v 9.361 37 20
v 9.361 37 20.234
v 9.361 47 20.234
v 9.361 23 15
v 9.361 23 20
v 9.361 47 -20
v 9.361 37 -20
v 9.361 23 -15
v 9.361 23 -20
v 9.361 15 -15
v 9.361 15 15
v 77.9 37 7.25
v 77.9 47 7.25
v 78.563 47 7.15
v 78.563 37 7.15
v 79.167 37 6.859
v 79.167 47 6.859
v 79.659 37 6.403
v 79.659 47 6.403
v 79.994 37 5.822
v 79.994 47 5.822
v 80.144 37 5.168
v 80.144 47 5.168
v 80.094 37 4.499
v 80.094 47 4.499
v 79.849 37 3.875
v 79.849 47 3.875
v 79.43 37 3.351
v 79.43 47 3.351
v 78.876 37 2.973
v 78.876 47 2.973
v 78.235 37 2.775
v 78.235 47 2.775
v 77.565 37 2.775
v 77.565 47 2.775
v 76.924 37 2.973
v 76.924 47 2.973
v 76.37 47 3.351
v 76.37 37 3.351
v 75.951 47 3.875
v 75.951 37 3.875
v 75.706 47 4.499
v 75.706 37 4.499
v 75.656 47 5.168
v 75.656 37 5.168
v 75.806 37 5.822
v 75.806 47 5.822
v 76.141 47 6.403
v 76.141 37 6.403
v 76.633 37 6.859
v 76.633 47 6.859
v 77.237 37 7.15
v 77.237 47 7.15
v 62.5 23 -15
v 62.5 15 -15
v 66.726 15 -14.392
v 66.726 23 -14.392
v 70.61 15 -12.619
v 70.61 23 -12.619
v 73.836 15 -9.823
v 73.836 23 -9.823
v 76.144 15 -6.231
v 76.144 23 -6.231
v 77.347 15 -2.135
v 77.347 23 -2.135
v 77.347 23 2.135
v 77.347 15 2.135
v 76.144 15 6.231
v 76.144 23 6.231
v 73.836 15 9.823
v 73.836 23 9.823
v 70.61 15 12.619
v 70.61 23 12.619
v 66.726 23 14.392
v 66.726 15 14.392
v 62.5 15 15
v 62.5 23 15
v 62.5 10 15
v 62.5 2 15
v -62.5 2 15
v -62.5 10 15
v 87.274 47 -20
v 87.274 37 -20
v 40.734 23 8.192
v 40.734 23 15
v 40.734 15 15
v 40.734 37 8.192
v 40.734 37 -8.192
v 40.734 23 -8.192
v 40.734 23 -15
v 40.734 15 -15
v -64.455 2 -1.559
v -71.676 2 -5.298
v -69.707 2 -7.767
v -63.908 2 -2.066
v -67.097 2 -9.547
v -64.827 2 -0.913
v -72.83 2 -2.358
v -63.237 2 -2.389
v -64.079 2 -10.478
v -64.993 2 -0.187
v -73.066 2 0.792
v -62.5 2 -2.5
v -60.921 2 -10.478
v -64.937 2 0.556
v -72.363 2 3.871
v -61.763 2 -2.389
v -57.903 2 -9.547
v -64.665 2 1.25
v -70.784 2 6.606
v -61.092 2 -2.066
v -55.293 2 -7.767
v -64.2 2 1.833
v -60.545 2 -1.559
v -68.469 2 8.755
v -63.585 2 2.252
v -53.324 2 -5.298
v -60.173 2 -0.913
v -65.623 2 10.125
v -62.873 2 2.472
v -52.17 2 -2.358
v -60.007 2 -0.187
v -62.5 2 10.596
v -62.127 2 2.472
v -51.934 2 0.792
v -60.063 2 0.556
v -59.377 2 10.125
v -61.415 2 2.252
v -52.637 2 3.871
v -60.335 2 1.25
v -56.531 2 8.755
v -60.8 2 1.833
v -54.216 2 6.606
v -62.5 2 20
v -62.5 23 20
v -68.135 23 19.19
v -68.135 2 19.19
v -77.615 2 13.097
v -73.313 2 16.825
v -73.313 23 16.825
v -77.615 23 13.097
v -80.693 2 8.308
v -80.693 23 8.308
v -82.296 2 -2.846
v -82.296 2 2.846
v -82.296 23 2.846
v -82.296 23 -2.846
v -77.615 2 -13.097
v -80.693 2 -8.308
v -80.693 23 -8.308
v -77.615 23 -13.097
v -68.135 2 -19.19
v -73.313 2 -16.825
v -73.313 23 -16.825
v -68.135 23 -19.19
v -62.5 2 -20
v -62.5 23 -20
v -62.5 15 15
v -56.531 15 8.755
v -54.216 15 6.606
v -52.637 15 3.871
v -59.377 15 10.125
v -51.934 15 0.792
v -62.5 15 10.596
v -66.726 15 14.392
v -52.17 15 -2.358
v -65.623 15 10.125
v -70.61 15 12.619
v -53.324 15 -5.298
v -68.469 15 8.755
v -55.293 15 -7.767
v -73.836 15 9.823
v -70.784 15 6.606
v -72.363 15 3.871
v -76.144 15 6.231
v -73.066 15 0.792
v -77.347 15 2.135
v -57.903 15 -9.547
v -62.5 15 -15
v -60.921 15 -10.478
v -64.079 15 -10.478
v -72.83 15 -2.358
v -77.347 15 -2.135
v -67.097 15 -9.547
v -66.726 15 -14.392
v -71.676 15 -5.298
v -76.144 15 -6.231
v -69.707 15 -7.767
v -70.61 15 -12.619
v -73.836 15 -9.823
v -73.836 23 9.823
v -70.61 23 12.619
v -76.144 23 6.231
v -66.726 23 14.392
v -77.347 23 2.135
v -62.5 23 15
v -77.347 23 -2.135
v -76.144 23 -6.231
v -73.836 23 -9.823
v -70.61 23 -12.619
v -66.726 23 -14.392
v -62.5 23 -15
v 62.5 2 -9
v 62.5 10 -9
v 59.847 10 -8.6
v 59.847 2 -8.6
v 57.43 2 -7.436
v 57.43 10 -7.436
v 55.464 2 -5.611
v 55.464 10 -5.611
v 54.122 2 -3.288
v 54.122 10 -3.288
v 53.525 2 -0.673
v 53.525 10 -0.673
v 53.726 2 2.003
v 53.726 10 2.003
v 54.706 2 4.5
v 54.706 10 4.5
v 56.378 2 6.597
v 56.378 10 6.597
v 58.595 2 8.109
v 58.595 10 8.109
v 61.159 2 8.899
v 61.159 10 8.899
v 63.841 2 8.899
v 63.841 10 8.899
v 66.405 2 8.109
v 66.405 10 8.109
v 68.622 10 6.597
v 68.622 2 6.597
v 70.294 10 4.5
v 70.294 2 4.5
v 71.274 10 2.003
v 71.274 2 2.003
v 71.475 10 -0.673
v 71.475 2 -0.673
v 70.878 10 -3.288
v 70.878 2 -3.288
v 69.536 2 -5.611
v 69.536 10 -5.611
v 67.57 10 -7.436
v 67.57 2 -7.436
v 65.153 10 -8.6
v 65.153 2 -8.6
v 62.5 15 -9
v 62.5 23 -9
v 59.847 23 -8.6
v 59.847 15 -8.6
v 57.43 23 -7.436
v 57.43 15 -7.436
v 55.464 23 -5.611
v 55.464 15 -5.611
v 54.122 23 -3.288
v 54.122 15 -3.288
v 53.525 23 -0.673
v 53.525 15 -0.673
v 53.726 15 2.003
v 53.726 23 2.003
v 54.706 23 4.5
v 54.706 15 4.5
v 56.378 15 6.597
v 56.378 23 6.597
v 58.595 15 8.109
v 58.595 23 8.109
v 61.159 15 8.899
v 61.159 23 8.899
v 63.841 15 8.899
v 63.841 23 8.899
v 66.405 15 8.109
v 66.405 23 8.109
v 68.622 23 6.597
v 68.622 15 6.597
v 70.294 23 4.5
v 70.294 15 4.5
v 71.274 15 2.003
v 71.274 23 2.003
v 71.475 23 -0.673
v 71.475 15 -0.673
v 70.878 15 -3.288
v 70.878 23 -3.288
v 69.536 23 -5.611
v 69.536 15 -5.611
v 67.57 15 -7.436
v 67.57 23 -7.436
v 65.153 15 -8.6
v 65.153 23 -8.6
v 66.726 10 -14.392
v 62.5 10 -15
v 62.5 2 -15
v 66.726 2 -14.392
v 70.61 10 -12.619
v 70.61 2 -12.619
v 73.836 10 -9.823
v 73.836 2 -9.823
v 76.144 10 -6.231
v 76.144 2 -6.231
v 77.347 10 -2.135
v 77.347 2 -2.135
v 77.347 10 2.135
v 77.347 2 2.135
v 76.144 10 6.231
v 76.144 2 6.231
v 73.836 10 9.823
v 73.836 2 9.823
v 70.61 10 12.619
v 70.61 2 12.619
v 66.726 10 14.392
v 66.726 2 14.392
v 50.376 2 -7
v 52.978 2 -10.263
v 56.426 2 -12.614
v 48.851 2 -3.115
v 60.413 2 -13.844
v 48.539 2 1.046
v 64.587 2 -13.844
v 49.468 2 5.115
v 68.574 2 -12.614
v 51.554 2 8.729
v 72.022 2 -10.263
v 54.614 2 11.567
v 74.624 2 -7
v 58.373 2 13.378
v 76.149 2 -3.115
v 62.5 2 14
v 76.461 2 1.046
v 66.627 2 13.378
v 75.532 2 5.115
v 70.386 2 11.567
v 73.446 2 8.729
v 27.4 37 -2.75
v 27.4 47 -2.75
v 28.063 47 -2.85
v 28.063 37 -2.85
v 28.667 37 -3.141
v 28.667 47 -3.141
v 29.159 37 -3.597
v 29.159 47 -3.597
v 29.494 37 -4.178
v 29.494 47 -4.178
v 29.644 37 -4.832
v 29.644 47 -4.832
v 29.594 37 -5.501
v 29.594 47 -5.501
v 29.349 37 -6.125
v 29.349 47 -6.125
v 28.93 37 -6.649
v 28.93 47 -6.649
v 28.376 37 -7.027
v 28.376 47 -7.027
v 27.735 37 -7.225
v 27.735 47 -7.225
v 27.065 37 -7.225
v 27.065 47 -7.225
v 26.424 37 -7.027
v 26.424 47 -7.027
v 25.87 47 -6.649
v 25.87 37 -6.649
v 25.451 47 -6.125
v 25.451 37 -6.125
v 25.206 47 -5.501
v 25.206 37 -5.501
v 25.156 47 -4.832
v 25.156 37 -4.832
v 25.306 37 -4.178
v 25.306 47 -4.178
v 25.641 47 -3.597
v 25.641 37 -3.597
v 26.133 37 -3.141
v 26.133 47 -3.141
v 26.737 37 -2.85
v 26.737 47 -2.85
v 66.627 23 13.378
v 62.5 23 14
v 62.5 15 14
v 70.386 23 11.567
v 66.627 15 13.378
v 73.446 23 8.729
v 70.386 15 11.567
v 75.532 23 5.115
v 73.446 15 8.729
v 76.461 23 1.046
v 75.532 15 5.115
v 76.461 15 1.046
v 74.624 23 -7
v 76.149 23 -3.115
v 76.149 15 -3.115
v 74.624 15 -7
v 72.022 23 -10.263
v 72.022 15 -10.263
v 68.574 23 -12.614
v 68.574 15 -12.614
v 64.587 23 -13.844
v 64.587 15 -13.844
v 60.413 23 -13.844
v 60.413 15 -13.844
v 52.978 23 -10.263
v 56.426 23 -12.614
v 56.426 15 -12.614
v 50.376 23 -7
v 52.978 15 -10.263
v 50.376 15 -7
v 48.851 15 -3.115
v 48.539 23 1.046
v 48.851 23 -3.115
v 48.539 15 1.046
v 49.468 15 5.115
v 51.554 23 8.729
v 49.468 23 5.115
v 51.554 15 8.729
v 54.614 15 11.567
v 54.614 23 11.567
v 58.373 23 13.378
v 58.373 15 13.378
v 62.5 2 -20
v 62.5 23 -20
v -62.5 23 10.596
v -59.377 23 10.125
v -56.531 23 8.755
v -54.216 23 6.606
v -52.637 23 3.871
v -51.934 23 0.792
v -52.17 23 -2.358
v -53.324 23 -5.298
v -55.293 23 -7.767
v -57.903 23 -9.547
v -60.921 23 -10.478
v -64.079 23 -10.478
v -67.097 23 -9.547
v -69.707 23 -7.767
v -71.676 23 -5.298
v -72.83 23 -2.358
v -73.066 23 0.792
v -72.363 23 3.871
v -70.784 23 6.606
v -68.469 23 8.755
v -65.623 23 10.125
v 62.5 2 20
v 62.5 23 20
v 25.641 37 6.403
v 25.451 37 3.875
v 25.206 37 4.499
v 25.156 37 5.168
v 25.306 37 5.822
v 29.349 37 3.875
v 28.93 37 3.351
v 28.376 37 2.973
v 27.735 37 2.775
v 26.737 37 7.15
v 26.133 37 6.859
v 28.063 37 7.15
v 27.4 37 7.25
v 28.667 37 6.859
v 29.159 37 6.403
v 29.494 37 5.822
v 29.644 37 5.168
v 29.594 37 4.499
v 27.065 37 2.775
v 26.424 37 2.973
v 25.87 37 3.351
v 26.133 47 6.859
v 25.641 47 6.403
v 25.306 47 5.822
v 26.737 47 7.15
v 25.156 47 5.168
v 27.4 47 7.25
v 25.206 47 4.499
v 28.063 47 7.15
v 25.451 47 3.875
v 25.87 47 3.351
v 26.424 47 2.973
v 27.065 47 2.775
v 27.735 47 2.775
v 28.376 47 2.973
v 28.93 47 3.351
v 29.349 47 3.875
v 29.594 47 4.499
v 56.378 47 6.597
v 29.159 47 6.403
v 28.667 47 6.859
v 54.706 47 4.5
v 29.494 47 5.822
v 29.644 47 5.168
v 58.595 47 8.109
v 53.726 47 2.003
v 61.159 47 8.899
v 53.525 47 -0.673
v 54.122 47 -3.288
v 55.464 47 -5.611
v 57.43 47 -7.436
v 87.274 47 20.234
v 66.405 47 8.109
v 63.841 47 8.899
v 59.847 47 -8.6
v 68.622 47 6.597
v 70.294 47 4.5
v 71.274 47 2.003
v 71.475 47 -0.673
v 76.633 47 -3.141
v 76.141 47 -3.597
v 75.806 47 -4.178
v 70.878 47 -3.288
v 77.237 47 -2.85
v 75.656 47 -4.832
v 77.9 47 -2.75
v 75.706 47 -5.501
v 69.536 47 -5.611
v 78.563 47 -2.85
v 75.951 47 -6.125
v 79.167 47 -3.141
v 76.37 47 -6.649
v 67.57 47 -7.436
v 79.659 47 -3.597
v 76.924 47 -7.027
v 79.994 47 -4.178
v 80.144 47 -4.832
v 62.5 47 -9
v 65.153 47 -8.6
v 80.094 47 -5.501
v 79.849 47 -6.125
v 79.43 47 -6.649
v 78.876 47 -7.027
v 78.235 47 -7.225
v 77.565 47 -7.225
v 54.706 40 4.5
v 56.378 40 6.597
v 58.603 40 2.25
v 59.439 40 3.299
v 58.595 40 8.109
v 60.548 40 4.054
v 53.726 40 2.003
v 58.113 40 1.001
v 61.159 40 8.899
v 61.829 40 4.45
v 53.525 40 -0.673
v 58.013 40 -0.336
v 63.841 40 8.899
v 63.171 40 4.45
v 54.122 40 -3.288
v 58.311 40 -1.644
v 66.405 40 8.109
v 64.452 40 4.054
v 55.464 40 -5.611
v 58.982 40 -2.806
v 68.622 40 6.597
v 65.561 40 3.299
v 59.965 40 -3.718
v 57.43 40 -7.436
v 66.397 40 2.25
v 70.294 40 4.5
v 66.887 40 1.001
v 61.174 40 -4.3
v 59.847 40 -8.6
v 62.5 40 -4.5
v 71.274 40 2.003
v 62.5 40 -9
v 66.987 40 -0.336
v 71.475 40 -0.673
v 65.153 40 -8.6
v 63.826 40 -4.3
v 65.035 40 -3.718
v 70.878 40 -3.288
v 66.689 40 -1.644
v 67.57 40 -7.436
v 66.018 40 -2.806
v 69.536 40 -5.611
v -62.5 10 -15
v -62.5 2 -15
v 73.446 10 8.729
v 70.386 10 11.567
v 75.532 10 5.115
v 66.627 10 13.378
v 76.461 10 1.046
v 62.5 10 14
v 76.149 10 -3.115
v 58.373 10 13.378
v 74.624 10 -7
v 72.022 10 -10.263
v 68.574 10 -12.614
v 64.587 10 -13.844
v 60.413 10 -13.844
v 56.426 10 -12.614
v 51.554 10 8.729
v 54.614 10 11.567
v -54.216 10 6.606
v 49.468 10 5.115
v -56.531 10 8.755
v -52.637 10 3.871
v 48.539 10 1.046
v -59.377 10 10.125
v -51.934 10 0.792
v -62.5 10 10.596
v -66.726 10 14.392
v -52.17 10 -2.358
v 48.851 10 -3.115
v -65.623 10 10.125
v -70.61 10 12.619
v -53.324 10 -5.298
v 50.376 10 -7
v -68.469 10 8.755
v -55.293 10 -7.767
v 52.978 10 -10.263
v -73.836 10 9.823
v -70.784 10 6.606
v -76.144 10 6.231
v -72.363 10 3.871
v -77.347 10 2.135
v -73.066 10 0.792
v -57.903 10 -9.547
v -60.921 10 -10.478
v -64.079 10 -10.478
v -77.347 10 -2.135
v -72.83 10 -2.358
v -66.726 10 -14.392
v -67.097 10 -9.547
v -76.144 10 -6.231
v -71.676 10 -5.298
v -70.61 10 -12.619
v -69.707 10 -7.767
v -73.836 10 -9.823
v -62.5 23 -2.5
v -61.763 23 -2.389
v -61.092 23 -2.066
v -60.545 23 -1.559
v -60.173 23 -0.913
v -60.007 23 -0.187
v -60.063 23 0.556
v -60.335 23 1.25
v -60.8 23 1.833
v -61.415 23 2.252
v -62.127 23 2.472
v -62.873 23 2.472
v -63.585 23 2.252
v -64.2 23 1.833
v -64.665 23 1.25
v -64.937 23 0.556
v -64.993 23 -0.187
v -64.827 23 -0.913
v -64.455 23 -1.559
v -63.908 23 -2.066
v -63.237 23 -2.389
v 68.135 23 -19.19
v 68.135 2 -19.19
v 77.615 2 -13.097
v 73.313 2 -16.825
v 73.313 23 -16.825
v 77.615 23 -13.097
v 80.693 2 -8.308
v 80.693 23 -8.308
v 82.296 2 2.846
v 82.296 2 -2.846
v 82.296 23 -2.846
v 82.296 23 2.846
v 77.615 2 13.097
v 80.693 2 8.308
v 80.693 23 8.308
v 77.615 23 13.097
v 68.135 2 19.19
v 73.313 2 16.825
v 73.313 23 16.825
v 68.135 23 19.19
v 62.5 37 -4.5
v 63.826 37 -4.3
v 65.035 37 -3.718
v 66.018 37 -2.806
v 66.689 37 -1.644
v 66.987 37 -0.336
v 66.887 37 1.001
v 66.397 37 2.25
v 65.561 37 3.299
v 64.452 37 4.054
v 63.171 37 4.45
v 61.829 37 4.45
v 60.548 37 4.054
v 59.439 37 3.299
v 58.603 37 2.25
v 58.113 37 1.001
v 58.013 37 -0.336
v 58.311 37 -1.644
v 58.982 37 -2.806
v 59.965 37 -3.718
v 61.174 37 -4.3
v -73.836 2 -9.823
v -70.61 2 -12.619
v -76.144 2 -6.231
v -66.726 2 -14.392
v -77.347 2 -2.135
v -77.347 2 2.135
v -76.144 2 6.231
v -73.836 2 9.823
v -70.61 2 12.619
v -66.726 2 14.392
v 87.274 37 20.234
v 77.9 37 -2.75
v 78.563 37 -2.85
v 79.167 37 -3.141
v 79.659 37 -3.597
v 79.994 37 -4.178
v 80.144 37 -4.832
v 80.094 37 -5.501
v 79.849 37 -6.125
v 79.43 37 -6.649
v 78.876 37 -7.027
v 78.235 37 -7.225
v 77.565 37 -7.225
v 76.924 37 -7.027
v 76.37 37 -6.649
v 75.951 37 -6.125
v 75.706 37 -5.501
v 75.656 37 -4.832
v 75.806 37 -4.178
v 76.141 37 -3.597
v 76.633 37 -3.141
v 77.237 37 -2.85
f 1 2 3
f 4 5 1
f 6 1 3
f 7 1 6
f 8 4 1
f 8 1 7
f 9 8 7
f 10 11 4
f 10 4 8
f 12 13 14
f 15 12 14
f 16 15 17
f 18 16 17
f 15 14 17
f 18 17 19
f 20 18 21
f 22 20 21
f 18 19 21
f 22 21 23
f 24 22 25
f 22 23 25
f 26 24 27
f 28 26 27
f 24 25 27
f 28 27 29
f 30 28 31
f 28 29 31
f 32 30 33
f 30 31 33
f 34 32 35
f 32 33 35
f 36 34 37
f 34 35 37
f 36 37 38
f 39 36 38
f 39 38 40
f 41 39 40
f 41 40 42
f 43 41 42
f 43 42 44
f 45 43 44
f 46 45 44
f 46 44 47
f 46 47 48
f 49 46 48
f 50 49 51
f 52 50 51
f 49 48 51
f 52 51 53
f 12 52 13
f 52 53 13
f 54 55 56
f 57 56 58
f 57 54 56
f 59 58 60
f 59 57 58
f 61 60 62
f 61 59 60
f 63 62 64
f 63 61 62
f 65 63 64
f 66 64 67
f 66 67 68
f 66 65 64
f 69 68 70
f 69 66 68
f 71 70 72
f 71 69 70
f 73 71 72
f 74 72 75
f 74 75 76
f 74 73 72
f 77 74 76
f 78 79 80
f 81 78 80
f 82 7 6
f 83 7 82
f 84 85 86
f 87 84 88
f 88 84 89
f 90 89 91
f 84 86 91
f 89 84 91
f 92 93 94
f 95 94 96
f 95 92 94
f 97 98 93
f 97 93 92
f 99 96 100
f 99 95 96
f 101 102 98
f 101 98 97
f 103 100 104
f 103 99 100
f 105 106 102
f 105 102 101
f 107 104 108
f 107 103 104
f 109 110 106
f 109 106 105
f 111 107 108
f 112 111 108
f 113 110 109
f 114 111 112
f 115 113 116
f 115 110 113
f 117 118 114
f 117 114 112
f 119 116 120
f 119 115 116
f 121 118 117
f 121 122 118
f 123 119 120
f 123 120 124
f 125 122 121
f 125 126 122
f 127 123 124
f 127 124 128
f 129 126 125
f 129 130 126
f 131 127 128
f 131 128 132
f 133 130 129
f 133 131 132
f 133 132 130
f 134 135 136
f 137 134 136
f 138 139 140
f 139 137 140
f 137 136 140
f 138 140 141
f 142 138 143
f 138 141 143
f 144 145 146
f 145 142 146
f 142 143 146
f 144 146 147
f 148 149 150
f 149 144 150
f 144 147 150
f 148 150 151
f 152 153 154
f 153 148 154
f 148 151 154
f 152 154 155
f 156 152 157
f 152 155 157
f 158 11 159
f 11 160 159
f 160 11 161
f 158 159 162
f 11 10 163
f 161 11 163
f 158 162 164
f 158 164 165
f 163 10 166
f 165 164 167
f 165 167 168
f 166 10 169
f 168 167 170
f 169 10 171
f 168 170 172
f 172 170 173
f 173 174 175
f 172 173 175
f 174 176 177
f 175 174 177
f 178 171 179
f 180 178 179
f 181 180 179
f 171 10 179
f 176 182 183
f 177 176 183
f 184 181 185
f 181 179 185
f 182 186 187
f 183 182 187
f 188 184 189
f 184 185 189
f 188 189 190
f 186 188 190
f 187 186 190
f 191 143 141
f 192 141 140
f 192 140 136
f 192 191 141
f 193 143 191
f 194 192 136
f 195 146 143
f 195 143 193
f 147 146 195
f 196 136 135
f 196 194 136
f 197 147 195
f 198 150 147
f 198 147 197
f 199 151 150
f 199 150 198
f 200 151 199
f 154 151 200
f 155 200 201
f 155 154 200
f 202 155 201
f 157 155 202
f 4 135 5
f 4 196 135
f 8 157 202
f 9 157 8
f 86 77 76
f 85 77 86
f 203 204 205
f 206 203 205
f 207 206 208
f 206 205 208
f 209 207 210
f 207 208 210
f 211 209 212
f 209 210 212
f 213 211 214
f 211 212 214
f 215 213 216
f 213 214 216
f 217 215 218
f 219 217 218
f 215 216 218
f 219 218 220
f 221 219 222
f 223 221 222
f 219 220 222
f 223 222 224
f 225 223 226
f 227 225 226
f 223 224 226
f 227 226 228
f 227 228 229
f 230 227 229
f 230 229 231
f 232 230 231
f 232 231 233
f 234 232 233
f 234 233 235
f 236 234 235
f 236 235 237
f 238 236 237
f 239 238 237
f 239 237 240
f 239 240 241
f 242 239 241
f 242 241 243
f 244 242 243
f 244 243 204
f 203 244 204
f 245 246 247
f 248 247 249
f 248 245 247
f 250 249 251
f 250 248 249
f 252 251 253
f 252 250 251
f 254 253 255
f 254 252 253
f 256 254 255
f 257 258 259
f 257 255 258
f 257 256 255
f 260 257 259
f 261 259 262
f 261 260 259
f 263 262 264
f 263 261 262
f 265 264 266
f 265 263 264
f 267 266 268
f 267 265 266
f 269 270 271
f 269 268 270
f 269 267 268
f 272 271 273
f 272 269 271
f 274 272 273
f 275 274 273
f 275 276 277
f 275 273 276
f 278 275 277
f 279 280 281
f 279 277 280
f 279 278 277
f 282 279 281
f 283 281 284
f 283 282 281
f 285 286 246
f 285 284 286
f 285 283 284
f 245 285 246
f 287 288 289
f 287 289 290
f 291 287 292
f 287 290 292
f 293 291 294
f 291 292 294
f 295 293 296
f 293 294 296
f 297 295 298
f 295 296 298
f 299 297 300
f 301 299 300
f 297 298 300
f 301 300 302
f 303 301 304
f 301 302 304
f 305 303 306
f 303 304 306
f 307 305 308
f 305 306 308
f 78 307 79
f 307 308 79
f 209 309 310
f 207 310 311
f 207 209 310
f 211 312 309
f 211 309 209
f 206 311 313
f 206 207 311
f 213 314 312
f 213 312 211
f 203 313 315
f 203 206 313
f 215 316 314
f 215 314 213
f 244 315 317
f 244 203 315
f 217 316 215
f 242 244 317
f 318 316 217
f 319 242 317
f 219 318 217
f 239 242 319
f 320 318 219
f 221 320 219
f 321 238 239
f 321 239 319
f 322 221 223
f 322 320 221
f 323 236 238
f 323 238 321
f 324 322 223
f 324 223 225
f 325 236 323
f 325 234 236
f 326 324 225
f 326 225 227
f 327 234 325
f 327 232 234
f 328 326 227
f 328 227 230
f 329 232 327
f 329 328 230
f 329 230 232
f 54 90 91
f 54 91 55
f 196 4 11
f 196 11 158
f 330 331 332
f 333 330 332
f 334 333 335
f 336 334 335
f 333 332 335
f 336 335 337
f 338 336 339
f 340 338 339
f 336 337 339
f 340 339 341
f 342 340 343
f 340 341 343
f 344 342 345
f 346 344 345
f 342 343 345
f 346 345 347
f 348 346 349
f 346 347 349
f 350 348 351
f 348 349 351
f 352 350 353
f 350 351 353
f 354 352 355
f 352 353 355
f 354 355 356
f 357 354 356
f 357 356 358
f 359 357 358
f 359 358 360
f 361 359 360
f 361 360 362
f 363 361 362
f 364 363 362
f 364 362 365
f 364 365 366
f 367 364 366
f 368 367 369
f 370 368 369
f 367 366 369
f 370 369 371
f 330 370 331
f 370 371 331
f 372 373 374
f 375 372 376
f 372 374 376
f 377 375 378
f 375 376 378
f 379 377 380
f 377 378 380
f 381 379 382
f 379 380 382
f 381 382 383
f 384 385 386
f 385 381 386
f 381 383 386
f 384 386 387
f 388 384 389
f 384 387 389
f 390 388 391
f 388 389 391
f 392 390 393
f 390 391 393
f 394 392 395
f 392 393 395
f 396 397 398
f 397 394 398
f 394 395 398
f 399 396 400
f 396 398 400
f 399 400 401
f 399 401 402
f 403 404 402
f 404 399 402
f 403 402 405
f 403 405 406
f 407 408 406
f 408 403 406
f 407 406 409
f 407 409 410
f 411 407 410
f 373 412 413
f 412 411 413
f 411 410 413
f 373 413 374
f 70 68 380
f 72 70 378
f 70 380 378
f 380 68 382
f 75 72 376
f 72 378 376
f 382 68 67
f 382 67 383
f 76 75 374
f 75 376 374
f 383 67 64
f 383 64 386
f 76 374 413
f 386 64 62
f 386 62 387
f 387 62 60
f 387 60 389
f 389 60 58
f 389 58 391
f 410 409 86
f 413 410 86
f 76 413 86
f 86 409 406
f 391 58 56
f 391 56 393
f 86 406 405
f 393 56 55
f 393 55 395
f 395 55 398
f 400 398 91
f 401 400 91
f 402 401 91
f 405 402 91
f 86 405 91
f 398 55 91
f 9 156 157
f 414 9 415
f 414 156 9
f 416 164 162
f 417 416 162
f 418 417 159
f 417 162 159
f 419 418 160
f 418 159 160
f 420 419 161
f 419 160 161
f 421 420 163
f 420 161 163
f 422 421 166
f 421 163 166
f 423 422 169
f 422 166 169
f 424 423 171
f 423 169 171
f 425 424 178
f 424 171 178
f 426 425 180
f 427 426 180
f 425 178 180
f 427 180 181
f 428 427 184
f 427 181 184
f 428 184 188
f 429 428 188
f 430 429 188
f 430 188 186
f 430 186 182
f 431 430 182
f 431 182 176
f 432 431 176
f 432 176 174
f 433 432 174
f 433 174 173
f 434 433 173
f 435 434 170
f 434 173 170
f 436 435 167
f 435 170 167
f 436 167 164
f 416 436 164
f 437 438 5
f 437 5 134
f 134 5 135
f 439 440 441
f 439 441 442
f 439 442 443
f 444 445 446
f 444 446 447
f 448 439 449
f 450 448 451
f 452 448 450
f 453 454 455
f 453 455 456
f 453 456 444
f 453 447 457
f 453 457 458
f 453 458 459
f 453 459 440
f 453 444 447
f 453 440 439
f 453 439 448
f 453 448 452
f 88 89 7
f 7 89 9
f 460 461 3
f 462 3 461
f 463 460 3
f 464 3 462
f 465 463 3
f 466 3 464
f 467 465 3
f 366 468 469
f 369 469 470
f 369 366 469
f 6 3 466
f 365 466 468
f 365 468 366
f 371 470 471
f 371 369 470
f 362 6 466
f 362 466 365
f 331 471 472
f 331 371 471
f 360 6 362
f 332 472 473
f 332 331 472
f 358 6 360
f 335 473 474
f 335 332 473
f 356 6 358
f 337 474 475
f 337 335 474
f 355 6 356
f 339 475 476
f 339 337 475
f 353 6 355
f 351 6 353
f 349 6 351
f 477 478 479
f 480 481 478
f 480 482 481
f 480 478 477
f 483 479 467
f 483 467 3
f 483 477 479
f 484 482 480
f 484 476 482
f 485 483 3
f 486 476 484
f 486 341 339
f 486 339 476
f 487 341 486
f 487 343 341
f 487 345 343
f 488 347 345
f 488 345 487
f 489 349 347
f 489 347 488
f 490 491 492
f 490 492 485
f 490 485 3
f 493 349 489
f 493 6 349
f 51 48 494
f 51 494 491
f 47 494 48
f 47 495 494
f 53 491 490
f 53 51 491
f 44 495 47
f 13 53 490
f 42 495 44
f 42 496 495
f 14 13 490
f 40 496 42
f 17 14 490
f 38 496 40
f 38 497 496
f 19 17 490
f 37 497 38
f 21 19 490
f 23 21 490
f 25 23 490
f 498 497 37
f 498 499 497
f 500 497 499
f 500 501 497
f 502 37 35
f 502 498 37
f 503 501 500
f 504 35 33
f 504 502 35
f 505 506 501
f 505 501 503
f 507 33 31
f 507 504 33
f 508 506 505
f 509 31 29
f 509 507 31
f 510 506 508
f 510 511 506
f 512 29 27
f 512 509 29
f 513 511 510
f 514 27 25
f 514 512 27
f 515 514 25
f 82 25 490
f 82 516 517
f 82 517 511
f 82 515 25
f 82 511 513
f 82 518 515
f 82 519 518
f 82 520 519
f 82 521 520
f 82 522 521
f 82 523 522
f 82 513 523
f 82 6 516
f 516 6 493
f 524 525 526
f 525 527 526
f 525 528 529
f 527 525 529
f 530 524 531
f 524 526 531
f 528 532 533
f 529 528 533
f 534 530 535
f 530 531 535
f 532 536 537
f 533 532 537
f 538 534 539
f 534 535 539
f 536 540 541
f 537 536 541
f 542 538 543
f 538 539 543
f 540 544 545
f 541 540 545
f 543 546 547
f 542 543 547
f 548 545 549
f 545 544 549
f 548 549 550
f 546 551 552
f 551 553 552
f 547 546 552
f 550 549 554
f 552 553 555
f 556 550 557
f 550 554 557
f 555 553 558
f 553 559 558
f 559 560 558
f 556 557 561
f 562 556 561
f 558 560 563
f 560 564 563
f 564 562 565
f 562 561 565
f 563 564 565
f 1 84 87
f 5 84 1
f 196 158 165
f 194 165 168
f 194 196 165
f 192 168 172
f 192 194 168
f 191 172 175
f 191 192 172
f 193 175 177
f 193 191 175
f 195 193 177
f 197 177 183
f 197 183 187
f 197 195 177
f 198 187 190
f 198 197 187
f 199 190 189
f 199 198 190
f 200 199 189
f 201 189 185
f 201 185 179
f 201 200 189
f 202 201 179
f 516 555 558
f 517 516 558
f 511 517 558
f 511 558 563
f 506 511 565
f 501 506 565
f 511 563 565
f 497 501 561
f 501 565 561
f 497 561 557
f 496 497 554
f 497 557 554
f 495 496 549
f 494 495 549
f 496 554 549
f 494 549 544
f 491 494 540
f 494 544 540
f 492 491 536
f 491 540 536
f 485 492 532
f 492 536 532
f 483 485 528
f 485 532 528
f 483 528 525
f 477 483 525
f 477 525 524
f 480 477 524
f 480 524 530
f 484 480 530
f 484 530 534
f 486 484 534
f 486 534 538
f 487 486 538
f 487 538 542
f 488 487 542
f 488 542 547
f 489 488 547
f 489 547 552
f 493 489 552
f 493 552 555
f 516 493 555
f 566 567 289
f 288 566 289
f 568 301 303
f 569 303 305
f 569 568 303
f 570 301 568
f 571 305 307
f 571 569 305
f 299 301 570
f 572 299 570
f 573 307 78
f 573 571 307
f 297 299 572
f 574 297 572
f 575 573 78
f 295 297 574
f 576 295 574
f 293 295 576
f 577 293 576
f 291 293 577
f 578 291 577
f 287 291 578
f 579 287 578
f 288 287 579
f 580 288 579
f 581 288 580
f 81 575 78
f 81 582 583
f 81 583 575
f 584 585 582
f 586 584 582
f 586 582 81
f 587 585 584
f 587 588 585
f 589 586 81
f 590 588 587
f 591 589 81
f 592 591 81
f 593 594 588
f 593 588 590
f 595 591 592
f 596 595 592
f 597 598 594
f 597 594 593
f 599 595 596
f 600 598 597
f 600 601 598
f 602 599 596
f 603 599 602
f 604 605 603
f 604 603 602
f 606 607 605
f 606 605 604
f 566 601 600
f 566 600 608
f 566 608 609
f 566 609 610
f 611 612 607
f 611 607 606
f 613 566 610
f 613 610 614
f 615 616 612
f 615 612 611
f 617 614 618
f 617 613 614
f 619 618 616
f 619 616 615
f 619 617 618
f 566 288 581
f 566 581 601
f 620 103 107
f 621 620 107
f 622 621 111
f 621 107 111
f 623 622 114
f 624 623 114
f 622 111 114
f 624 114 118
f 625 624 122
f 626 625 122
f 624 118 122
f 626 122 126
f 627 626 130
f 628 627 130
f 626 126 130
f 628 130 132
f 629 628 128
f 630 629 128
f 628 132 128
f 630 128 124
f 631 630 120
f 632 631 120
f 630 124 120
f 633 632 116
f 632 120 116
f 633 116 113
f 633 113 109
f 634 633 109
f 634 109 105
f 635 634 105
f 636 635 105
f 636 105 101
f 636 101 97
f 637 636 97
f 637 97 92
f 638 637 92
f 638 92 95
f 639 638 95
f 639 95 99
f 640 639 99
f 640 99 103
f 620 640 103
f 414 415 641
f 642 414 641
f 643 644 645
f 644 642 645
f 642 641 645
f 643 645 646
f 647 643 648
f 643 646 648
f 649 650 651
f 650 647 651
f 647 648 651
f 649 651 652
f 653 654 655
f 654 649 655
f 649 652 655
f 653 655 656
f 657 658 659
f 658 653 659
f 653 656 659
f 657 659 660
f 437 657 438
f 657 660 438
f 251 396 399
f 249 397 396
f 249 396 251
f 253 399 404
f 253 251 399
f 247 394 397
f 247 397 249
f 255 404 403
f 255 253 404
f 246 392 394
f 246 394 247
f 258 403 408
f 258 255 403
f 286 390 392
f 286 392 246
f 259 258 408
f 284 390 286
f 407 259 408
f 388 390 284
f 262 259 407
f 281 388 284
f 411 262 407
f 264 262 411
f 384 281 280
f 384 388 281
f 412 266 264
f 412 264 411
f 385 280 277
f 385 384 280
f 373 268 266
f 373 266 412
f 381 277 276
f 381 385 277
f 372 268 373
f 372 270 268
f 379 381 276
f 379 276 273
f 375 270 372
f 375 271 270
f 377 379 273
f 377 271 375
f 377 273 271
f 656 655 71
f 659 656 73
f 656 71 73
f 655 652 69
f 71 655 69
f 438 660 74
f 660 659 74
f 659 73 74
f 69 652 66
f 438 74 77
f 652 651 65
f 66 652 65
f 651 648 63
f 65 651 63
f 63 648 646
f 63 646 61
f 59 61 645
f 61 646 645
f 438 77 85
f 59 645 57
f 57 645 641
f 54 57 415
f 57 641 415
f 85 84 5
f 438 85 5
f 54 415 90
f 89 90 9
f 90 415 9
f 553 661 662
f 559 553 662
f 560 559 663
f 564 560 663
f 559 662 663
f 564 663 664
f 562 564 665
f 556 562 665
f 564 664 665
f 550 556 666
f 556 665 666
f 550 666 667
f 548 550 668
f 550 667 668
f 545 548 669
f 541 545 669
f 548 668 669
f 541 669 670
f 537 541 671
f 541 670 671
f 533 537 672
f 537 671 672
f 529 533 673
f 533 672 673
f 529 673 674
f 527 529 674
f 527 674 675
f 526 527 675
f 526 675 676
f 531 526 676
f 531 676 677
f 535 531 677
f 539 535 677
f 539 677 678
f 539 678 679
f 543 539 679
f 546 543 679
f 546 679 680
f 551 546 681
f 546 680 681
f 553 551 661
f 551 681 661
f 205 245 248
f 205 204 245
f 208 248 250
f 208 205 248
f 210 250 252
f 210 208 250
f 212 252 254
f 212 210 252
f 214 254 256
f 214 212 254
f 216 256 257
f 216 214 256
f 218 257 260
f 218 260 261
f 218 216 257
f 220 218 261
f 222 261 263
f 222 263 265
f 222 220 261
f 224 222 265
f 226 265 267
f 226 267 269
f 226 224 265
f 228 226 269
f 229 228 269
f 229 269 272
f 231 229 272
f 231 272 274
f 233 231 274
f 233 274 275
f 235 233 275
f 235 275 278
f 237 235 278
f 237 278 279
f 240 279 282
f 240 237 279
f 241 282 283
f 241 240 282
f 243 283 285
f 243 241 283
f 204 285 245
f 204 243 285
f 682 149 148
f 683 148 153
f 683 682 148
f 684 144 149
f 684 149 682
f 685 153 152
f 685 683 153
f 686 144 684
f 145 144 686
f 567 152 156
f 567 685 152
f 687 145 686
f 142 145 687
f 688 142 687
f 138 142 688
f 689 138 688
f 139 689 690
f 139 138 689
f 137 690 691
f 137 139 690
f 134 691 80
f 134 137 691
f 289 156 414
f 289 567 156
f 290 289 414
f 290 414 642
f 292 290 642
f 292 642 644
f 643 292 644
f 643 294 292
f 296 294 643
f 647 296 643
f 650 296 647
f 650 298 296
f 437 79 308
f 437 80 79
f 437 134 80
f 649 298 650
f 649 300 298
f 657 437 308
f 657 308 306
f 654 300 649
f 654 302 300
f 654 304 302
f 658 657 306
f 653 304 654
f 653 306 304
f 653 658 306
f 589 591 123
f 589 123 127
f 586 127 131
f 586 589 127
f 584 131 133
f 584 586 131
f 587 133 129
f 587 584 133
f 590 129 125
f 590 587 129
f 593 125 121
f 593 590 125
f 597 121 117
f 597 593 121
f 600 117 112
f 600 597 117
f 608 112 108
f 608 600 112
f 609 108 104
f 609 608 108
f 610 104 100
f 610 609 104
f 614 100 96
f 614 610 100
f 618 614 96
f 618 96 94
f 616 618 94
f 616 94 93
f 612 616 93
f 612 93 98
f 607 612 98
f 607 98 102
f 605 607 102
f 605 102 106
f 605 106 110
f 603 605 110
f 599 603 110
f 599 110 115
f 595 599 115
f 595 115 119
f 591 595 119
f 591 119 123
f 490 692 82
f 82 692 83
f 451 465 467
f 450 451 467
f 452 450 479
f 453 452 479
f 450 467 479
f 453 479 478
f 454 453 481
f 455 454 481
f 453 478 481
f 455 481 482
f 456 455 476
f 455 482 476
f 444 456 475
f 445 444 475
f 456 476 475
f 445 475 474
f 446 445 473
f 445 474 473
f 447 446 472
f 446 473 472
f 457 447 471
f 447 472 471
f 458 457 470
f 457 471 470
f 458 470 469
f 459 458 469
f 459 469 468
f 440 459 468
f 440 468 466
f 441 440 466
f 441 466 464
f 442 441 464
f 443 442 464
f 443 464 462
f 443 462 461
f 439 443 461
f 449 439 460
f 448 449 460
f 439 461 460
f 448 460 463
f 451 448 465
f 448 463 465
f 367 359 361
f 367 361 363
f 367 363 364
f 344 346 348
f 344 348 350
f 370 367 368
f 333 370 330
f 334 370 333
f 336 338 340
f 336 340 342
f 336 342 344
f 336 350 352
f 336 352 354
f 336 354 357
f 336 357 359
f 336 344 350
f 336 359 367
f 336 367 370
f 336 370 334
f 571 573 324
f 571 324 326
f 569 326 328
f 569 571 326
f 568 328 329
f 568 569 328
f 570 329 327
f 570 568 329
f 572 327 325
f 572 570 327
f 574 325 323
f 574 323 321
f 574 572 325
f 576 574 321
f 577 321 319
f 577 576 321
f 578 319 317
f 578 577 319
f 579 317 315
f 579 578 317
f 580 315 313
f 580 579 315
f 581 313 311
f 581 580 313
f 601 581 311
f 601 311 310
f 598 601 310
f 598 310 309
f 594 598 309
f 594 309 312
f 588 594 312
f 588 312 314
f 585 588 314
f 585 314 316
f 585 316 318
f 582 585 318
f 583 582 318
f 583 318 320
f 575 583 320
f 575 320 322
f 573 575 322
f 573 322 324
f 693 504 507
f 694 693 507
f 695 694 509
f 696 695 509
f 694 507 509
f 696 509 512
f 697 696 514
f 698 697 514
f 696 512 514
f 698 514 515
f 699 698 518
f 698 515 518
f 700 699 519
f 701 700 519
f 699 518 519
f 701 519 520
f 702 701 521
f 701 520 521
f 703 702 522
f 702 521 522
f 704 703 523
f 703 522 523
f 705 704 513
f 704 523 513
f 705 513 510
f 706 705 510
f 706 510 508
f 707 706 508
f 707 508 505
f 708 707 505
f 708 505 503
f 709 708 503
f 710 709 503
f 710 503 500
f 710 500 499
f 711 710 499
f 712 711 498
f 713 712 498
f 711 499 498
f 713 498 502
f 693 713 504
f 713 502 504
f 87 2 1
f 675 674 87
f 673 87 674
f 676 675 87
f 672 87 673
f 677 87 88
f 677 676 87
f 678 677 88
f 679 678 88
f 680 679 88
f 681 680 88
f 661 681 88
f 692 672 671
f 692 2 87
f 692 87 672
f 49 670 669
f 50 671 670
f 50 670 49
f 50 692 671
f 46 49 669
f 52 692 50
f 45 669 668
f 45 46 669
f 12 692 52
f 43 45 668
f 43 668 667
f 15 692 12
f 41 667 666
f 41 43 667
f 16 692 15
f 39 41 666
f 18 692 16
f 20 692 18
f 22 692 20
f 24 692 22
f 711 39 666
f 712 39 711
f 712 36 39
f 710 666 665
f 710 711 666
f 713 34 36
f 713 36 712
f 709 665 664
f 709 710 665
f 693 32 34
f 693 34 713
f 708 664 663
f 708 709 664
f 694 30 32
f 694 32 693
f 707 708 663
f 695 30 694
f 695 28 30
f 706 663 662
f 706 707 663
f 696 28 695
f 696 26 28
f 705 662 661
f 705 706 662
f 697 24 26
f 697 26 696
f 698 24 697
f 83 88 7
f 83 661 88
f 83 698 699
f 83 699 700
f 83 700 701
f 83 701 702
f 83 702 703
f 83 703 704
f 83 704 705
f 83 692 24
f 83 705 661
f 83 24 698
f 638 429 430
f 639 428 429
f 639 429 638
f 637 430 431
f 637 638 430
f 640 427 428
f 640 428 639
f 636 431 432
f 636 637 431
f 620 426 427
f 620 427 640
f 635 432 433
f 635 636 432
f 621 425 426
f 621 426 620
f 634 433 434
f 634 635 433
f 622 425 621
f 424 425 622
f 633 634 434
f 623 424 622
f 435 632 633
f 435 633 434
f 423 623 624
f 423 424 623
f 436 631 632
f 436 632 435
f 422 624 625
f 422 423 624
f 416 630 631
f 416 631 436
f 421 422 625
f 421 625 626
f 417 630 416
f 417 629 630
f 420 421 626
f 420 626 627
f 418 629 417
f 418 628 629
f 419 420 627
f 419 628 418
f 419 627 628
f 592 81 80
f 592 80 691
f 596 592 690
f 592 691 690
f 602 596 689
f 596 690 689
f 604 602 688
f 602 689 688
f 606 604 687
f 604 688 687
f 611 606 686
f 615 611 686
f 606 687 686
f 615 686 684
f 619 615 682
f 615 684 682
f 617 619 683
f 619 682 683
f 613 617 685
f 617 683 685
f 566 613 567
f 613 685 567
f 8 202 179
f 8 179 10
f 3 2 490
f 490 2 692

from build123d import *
from build123d.topology import SkipClean

# Parameters (mm, degrees)
BOSS_EXTRUDE1_DEPTH      = 25
SKETCH4_R                = 2.5
CUT_EXTRUDE1_DEPTH       = 101.40542814
CUT_EXTRUDE2_DEPTH       = 10
CUT_EXTRUDE2_DEPTH_BACK  = 101.40542814
CUT_EXTRUDE3_START       = -10
CUT_EXTRUDE3_DEPTH       = 10
SKETCH8_R                = 9
CUT_EXTRUDE5_DEPTH       = 99.393343271
CUT_EXTRUDE6_REACH       = 102.405
BOSS_EXTRUDE3_DEPTH      = 8
BOSS_EXTRUDE3_DEPTH_BACK = 14
SKETCH11_R               = 14
SKETCH11_R_2             = 9
BOSS_EXTRUDE4_DEPTH      = 8
BOSS_EXTRUDE4_DEPTH_BACK = 14
SKETCH9_R                = 10.595859712
SKETCH12_R               = 2.5
CUT_EXTRUDE7_DEPTH       = 89.217061842
SKETCH13_W               = 193.888130969
SKETCH13_H               = 72.528835421
CUT_EXTRUDE8_DEPTH       = 2
SKETCH14_W               = 198.779610567
SKETCH14_H               = 62.99888379
CUT_EXTRUDE9_DEPTH       = 2
SKETCH15_W               = 31.372938112
SKETCH15_H               = 40
BOSS_EXTRUDE6_DEPTH      = 22
SKETCH16_W               = 77.912477191
SKETCH16_H               = 40.233640204
BOSS_EXTRUDE7_DEPTH      = 10
SKETCH17_R               = 9
CUT_EXTRUDE10_DEPTH      = 10
SKETCH18_R               = 2.25
CUT_EXTRUDE11_DEPTH      = 10
CUT_EXTRUDE12_DEPTH      = 14
CUT_EXTRUDE13_DEPTH      = 14
SKETCH21_R               = 9
SKETCH21_R_2             = 4.5
BOSS_EXTRUDE9_DEPTH      = 3


with BuildPart() as part:
    # Sketch1 → Boss-Extrude1 (new body)
    with BuildSketch(Plane(origin=(0, 0, 0), x_dir=(1, 0, 0), z_dir=(0, 1, 0))):
        with BuildLine():
            Line((-62.5, 30), (62.5, 30))
            ThreePointArc((62.5, 30), (92.5, 0), (62.5, -30))
            Line((62.5, -30), (-62.5, -30))
            ThreePointArc((-62.5, -30), (-92.5, 0), (-62.5, 30))
        make_face()
    extrude(amount=BOSS_EXTRUDE1_DEPTH)

    # Sketch4 → Cut-Extrude1 (cut, through all)
    with BuildSketch(Plane(origin=(0, 25, 0), x_dir=(1, 0, 0), z_dir=(0, 1, 0))):
        with Locations((-62.5, 0)):
            Circle(SKETCH4_R)
    extrude(amount=-CUT_EXTRUDE1_DEPTH, mode=Mode.SUBTRACT)

    # Sketch1<3> → Cut-Extrude2 (cut, two sides: drawn at the far end of the back side and taken through both)
    with BuildSketch(Plane(origin=(0, 0, 0), x_dir=(1, 0, 0), z_dir=(0, 1, 0)).offset(-CUT_EXTRUDE2_DEPTH_BACK)):
        with BuildLine():
            Line((-62.5, 15), (62.5, 15))
            ThreePointArc((62.5, 15), (77.5, 0), (62.5, -15))
            Line((62.5, -15), (-62.5, -15))
            ThreePointArc((-62.5, -15), (-77.5, 0), (-62.5, 15))
        make_face()
    extrude(amount=CUT_EXTRUDE2_DEPTH + CUT_EXTRUDE2_DEPTH_BACK, mode=Mode.SUBTRACT)

    # Sketch7 → Cut-Extrude3 (cut)
    with BuildSketch(Plane(origin=(0, 25, 0), x_dir=(1, 0, 0), z_dir=(0, 1, 0)).offset(CUT_EXTRUDE3_START)):
        with BuildLine():
            Line((-62.5, 15), (62.5, 15))
            ThreePointArc((62.5, 15), (77.5, 0), (62.5, -15))
            Line((62.5, -15), (-62.5, -15))
            ThreePointArc((-62.5, -15), (-77.5, 0), (-62.5, 15))
        make_face()
    extrude(amount=CUT_EXTRUDE3_DEPTH, mode=Mode.SUBTRACT)

    # Sketch8 → Cut-Extrude5 (cut, through all)
    with BuildSketch(Plane(origin=(0, 10, 0), x_dir=(-1, 0, 0), z_dir=(0, -1, 0))):
        with Locations((-62.5, 0)):
            Circle(SKETCH8_R)
    extrude(amount=-CUT_EXTRUDE5_DEPTH, mode=Mode.SUBTRACT)

    # Sketch10 → Cut-Extrude6 (cut, up to next)
    with BuildSketch(Plane(origin=(0, 25, 0), x_dir=(1, 0, 0), z_dir=(0, 1, 0)), mode=Mode.PRIVATE) as cut_extrude6_sk1:
        with BuildLine():
            Line((-62.5, -30), (62.5, -30))
            ThreePointArc((62.5, -30), (92.5, 0), (62.5, 30))
            Line((62.5, 30), (-62.5, 30))
            ThreePointArc((-62.5, 30), (-92.5, 0), (-62.5, -30))
        make_face()
        with BuildLine():
            Line((-62.5, 20), (62.5, 20))
            ThreePointArc((62.5, 20), (82.5, 0), (62.5, -20))
            Line((62.5, -20), (-62.5, -20))
            ThreePointArc((-62.5, -20), (-82.5, 0), (-62.5, 20))
        make_face(mode=Mode.SUBTRACT)
    cut_extrude6_tool1 = extrude(cut_extrude6_sk1.sketch, amount=-CUT_EXTRUDE6_REACH, mode=Mode.PRIVATE) & part.part
    add(cut_extrude6_tool1.solids().sort_by_distance((0, 25, 28.055135))[0], mode=Mode.SUBTRACT)

    # Sketch11 → Boss-Extrude3 (add, two sides: drawn at the far end of the back side and taken through both)
    with BuildSketch(Plane(origin=(0, 15, 0), x_dir=(1, 0, 0), z_dir=(0, 1, 0)).offset(-BOSS_EXTRUDE3_DEPTH_BACK)):
        with Locations((62.5, 0)):
            Circle(SKETCH11_R)
        with Locations((62.5, 0)):
            Circle(SKETCH11_R_2, mode=Mode.SUBTRACT)
    extrude(amount=BOSS_EXTRUDE3_DEPTH + BOSS_EXTRUDE3_DEPTH_BACK)

    # Sketch9 → Boss-Extrude4 (add, two sides: drawn at the far end of the back side and taken through both)
    with BuildSketch(Plane(origin=(0, 15, 0), x_dir=(1, 0, 0), z_dir=(0, 1, 0)).offset(-BOSS_EXTRUDE4_DEPTH_BACK)):
        with Locations((-62.5, 0)):
            Circle(SKETCH9_R)
    extrude(amount=BOSS_EXTRUDE4_DEPTH + BOSS_EXTRUDE4_DEPTH_BACK)

    # Sketch12 → Cut-Extrude7 (cut, through all)
    with BuildSketch(Plane.XZ.offset(-1)):
        with Locations((-62.5, 0)):
            Circle(SKETCH12_R)
    extrude(amount=-CUT_EXTRUDE7_DEPTH, mode=Mode.SUBTRACT)

    # Sketch13 → Cut-Extrude8 (cut)
    with BuildSketch(Plane(origin=(0, 25, 0), x_dir=(1, 0, 0), z_dir=(0, 1, 0))):
        with Locations((-4.849311671, -4.672767471)):
            Rectangle(SKETCH13_W, SKETCH13_H)
    extrude(amount=-CUT_EXTRUDE8_DEPTH, mode=Mode.SUBTRACT)

    # Sketch14 → Cut-Extrude9 (cut)
    with BuildSketch(Plane.XZ):
        with Locations((0.126503783, -3.704696323)):
            Rectangle(SKETCH14_W, SKETCH14_H)
    extrude(amount=-CUT_EXTRUDE9_DEPTH, mode=Mode.SUBTRACT)

    # Sketch15 → Boss-Extrude6 (add)
    with BuildSketch(Plane(origin=(0, 15, 0), x_dir=(1, 0, 0), z_dir=(0, 1, 0))):
        with Locations((25.047748977, 0)):
            Rectangle(SKETCH15_W, SKETCH15_H)
    extrude(amount=BOSS_EXTRUDE6_DEPTH)

    # Sketch16 → Boss-Extrude7 (add)
    with SkipClean():  # the faces are left unmerged after this step: merging them gives an invalid solid
        with BuildSketch(Plane(origin=(0, 37, 0), x_dir=(1, 0, 0), z_dir=(0, 1, 0))):
            with Locations((48.317518517, -0.116820102)):
                Rectangle(SKETCH16_W, SKETCH16_H)
        extrude(amount=BOSS_EXTRUDE7_DEPTH)

    # Sketch17 → Cut-Extrude10 (cut)
    with SkipClean():  # the faces are left unmerged after this step: merging them gives an invalid solid
        with BuildSketch(Plane.XZ.offset(-37)):
            with Locations((62.5, 0)):
                Circle(SKETCH17_R)
        extrude(amount=-CUT_EXTRUDE10_DEPTH, mode=Mode.SUBTRACT)

    # Sketch18 → Cut-Extrude11 (cut)
    with SkipClean():  # the faces are left unmerged after this step: merging them gives an invalid solid
        with BuildSketch(Plane(origin=(0, 47, 0), x_dir=(1, 0, 0), z_dir=(0, 1, 0))):
            with Locations((27.4, 5)):
                Circle(SKETCH18_R)
            with Locations((27.4, -5)):
                Circle(SKETCH18_R)
            with Locations((77.9, 5)):
                Circle(SKETCH18_R)
            with Locations((77.9, -5)):
                Circle(SKETCH18_R)
        extrude(amount=-CUT_EXTRUDE11_DEPTH, mode=Mode.SUBTRACT)

    # Sketch19 → Cut-Extrude12 (cut)
    with BuildSketch(Plane(origin=(0, 23, 0), x_dir=(1, 0, 0), z_dir=(0, 1, 0))):
        Polygon((62.5, 0), (9.361279921, 20), (62.5, 20), align=None)
    extrude(amount=CUT_EXTRUDE12_DEPTH, mode=Mode.SUBTRACT)

    # Sketch20 → Cut-Extrude13 (cut)
    with BuildSketch(Plane(origin=(0, 23, 0), x_dir=(1, 0, 0), z_dir=(0, 1, 0))):
        Polygon((62.5, 0), (9.361279921, -20), (62.5, -20.233640204), align=None)
    extrude(amount=CUT_EXTRUDE13_DEPTH, mode=Mode.SUBTRACT)

    # Sketch21 → Boss-Extrude9 (add)
    with BuildSketch(Plane.XZ.offset(-37)):
        with Locations((62.5, 0)):
            Circle(SKETCH21_R)
        with Locations((62.5, 0)):
            Circle(SKETCH21_R_2, mode=Mode.SUBTRACT)
    extrude(amount=-BOSS_EXTRUDE9_DEPTH)


solid = part.part
